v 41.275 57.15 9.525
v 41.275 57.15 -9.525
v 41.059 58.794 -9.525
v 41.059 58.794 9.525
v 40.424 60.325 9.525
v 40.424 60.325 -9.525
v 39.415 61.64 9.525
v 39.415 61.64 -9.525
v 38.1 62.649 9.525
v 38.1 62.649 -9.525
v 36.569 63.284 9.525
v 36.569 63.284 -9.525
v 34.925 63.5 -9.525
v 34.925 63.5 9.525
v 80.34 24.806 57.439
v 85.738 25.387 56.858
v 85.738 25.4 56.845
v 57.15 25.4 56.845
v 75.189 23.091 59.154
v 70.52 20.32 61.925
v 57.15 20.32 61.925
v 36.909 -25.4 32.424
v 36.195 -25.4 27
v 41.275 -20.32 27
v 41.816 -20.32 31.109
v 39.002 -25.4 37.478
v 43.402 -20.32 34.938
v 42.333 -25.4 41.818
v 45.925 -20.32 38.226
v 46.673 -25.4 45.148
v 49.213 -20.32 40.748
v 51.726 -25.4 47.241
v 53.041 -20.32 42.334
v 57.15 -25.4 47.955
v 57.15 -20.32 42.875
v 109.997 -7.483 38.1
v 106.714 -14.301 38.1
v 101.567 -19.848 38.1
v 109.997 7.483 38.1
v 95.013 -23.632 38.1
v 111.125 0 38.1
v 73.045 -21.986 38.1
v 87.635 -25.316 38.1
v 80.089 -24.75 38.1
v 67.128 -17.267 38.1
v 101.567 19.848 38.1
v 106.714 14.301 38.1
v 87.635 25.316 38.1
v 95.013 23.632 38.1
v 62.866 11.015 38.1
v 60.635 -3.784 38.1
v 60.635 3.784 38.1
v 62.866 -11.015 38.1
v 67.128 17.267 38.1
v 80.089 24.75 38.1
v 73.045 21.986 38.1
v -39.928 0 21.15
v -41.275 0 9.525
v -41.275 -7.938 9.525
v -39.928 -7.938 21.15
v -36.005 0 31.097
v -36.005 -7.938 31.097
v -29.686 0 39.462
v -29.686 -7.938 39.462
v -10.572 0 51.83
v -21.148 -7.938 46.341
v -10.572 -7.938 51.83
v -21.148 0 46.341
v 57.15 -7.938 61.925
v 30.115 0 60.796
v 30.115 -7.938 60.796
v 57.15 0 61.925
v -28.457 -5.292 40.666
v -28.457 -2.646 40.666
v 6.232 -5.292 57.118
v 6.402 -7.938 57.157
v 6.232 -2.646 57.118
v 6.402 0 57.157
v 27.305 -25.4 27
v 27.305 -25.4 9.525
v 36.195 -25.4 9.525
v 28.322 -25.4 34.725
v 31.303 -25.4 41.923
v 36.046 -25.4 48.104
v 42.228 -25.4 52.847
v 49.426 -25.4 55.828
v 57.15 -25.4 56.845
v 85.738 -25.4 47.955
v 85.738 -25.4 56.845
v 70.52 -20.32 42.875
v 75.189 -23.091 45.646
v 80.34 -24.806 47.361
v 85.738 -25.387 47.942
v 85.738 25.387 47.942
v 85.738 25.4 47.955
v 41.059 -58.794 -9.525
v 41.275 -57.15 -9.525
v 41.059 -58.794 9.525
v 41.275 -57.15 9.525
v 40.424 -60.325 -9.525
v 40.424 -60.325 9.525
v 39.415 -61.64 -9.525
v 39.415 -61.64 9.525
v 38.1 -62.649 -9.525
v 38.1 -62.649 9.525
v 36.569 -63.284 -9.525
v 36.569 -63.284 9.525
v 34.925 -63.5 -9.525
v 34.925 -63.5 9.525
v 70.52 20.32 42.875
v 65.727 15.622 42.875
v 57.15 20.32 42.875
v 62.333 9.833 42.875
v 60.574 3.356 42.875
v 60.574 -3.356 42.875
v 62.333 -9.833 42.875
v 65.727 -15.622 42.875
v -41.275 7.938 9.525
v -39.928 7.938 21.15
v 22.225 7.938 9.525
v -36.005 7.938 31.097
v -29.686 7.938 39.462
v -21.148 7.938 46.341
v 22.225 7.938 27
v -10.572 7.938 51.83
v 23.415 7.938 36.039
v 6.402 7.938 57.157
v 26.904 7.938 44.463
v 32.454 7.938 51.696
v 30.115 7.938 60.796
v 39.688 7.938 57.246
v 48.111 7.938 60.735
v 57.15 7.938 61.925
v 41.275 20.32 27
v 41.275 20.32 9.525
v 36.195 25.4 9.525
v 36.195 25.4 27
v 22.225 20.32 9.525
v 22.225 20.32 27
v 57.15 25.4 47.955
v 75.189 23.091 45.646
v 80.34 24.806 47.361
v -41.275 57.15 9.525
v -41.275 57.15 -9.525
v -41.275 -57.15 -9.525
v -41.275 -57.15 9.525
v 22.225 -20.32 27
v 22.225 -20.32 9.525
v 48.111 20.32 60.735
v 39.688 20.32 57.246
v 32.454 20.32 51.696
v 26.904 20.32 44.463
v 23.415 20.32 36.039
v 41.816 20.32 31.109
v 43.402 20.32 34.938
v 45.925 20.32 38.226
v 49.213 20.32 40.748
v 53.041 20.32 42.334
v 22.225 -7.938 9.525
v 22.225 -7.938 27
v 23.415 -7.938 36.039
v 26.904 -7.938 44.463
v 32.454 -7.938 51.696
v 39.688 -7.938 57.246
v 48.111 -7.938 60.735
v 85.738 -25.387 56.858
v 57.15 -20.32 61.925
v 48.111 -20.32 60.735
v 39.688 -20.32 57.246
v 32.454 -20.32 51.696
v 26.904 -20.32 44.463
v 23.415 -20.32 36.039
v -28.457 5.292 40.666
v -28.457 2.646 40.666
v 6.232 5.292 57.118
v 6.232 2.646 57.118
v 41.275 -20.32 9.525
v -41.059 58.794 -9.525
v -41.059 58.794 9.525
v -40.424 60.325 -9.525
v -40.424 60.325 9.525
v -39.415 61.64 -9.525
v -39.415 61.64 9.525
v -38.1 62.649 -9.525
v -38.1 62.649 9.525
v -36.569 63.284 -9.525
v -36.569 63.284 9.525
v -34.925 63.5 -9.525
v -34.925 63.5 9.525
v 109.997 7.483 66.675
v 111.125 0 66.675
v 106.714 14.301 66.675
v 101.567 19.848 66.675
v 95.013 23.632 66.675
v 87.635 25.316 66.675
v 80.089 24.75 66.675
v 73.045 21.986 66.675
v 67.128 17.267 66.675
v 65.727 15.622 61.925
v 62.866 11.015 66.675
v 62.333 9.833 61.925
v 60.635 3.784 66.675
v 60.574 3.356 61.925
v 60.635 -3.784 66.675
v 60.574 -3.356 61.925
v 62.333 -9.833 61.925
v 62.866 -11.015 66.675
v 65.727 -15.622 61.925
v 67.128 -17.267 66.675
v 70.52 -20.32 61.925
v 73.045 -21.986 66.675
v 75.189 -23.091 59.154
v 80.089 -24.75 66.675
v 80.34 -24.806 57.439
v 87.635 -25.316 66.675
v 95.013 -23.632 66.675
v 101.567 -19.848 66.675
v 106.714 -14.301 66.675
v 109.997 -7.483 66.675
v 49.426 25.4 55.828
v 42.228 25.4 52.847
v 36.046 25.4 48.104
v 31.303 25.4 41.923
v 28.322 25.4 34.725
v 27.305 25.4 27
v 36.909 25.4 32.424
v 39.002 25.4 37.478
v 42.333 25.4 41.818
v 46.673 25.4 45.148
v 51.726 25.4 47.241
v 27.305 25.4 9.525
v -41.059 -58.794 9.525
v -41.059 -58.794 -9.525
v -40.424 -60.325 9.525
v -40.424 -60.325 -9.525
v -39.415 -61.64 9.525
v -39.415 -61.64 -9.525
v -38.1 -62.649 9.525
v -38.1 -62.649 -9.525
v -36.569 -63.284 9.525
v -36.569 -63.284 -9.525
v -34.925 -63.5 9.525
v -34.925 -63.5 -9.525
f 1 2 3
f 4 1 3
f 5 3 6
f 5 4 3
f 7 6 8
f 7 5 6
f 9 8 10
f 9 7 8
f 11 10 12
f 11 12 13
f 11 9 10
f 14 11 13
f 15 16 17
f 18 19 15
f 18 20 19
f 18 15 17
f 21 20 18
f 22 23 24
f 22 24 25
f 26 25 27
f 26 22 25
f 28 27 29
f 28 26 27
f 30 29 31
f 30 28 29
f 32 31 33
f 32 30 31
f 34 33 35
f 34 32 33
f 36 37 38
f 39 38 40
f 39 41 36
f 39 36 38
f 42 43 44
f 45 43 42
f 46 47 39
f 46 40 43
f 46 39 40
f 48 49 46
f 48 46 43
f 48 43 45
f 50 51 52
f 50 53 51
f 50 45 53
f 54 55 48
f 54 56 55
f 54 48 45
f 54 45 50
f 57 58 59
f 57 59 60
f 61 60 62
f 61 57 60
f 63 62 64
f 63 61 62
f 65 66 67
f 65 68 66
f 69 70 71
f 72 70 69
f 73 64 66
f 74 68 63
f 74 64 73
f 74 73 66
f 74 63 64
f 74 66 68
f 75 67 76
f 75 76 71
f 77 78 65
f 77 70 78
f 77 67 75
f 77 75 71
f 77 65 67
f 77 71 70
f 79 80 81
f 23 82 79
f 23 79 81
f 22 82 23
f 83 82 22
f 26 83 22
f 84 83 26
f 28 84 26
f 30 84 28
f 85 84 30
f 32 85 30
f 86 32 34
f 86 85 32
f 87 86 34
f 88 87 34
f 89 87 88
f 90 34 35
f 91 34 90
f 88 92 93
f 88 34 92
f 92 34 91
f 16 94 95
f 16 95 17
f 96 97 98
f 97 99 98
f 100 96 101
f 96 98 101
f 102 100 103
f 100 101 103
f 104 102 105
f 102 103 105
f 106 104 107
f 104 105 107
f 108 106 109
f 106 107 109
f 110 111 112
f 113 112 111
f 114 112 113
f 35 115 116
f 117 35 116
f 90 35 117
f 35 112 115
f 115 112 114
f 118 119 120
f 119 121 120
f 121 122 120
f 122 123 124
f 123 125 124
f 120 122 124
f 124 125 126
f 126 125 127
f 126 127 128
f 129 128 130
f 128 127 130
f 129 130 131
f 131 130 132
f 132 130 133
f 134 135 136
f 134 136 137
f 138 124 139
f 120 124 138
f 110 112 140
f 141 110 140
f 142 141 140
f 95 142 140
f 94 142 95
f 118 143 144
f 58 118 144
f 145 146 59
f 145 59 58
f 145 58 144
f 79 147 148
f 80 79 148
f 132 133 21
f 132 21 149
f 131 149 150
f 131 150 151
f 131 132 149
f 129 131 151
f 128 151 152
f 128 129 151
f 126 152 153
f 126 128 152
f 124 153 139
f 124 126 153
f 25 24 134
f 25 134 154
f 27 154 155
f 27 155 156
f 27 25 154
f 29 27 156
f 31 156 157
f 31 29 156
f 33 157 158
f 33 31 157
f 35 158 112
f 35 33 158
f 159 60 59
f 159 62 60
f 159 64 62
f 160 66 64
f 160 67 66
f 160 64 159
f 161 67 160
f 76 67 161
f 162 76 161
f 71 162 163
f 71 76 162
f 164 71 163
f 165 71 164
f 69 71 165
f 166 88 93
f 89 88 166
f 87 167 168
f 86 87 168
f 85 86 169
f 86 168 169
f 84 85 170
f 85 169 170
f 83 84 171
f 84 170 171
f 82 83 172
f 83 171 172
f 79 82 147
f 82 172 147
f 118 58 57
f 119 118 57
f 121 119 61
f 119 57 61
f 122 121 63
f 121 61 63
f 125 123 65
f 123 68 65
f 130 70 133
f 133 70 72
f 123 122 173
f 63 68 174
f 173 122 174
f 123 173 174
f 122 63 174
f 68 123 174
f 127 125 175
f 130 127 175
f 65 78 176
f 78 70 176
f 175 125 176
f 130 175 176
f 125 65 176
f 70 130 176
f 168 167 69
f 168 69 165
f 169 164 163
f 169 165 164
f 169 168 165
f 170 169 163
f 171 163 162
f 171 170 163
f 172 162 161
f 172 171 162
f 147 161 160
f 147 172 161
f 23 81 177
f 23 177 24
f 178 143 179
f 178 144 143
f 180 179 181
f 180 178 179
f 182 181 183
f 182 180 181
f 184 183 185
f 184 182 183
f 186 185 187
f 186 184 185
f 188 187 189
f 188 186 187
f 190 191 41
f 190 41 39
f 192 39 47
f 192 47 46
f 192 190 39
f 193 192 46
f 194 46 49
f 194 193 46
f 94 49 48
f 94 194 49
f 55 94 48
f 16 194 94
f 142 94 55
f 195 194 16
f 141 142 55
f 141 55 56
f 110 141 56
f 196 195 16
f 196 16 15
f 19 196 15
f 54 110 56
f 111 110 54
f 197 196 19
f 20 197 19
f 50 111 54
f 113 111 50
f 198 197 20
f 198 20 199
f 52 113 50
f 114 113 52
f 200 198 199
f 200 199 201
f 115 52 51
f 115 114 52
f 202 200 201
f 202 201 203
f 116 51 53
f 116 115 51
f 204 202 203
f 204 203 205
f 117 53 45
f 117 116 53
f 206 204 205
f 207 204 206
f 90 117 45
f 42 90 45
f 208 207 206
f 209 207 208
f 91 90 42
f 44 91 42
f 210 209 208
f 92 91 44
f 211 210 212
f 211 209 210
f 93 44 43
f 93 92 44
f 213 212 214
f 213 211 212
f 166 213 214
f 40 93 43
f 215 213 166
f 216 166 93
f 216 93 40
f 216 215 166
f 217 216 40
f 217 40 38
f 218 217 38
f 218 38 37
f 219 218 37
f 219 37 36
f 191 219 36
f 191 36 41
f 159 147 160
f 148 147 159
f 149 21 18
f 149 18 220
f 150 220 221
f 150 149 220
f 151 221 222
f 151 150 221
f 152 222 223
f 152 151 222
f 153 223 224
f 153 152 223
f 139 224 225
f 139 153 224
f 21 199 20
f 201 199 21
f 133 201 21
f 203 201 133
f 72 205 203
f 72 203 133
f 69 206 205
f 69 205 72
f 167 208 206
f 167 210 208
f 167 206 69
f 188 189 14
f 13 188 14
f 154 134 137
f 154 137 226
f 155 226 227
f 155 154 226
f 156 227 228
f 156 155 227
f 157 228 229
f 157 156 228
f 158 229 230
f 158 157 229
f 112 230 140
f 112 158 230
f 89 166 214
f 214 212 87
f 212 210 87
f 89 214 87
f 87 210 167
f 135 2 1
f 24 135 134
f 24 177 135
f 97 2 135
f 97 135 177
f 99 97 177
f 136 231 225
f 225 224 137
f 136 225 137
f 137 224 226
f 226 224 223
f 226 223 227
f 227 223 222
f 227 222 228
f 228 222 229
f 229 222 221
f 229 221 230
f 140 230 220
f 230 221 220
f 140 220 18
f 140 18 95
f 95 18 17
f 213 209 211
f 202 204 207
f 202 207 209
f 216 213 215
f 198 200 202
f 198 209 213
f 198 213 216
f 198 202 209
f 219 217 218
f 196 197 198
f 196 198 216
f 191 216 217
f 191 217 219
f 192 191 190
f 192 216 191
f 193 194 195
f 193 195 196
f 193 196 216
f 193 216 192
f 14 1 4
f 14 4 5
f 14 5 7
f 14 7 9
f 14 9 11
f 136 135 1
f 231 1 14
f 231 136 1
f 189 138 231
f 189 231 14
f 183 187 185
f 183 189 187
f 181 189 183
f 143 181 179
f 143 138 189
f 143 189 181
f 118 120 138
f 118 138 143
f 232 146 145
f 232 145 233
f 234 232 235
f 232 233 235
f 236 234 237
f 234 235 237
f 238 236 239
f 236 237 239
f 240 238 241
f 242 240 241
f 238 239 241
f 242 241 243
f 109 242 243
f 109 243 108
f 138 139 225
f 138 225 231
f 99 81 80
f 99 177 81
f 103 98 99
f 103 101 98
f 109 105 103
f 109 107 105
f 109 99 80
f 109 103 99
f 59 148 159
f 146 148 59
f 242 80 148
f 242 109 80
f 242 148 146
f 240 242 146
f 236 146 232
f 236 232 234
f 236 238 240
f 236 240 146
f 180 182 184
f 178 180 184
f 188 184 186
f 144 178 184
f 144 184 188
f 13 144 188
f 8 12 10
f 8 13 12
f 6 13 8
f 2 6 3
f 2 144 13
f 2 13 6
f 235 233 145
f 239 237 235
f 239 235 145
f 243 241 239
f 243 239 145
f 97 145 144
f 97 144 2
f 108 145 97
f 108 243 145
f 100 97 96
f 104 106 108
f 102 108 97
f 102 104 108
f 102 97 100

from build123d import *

# Parameters (mm, degrees)
F1_DEPTH = 63.5
F0_W     = 25.4132496778
F0_H     = 19.05
F2_DEPTH = 25.4
F3_DEPTH = 7.9375
F5_R     = 6.35
F6_SIZE  = 5.08


with BuildPart() as f1:
    # F0 (on Front) → F1 (new body, symmetric)
    with BuildSketch(Plane.XZ):
        Polygon((41.275, -9.525), (41.275, 9.525), (22.225, 9.525), (-41.275, 9.525), (-41.275, -9.525), align=None)
    extrude(amount=F1_DEPTH, both=True)

    # F0 (on Front) → F2 (join, symmetric)
    with BuildSketch(Plane.XZ):
        with BuildLine():
            Line((22.225, 9.525), (41.275, 9.525))
            Line((41.275, 9.525), (41.275, 27.0002))
            ThreePointArc((41.275, 27.0002), (45.9246798487, 38.2255201513), (57.15, 42.8752))
            Line((57.15, 42.8752), (60.325, 42.8752))
            Line((60.325, 42.8752), (60.325, 61.9252))
            Line((60.325, 61.9252), (57.15, 61.9252))
            ThreePointArc((57.15, 61.9252), (32.4542956671, 51.6959043329), (22.225, 27.0002))
            Line((22.225, 27.0002), (22.225, 9.525))
        make_face()
        with Locations((73.0316248389, 52.4002)):
            Rectangle(F0_W, F0_H)
    extrude(amount=F2_DEPTH, both=True)

    # F0 (on Front) → F3 (join, symmetric)
    with BuildSketch(Plane.XZ):
        with BuildLine():
            Line((-41.275, 9.525), (22.225, 9.525))
            Line((22.225, 9.525), (22.225, 27.0002))
            ThreePointArc((22.225, 27.0002), (32.4542956671, 51.6959043329), (57.15, 61.9252))
            add(Edge.make_bspline(
                [(-41.275, 9.525), (-41.275, 49.0254089236), (0, 61.9252), (57.15, 61.9252)],
                knots=[0, 0, 0, 0, 111.5045361635, 111.5045361635, 111.5045361635, 111.5045361635], degree=3))
        make_face()
    extrude(amount=F3_DEPTH, both=True)

    # F0 (on Front) → F4 (revolve)
    with BuildSketch(Plane.XZ):
        Polygon((85.7382496778, 61.9252), (85.7382496778, 42.8752), (85.7382496778, 38.1), (111.125, 38.1), (111.125, 66.675), (85.7382496778, 66.675), align=None)
    revolve(axis=Axis((85.7382496778, 0, 52.3875), (0, 0, 1)))

    # F5
    f5_edges = [f1.edges().sort_by_distance(p)[0] for p in [
        (-41.275, -63.5, 0),
        (41.275, -63.5, 0),
        (41.275, 63.5, 0),
        (-41.275, 63.5, 0),
    ]]
    fillet(f5_edges, radius=F5_R)

    # F6
    f6_edges = [f1.edges().sort_by_distance(p)[0] for p in [
        (32.454296, 25.4, 51.695904),
        (32.454296, -25.4, 51.695904),
        (45.92468, -25.4, 38.22552),
        (45.92468, 25.4, 38.22552),
    ]]
    chamfer(f6_edges, length=F6_SIZE)


solid = f1.part
